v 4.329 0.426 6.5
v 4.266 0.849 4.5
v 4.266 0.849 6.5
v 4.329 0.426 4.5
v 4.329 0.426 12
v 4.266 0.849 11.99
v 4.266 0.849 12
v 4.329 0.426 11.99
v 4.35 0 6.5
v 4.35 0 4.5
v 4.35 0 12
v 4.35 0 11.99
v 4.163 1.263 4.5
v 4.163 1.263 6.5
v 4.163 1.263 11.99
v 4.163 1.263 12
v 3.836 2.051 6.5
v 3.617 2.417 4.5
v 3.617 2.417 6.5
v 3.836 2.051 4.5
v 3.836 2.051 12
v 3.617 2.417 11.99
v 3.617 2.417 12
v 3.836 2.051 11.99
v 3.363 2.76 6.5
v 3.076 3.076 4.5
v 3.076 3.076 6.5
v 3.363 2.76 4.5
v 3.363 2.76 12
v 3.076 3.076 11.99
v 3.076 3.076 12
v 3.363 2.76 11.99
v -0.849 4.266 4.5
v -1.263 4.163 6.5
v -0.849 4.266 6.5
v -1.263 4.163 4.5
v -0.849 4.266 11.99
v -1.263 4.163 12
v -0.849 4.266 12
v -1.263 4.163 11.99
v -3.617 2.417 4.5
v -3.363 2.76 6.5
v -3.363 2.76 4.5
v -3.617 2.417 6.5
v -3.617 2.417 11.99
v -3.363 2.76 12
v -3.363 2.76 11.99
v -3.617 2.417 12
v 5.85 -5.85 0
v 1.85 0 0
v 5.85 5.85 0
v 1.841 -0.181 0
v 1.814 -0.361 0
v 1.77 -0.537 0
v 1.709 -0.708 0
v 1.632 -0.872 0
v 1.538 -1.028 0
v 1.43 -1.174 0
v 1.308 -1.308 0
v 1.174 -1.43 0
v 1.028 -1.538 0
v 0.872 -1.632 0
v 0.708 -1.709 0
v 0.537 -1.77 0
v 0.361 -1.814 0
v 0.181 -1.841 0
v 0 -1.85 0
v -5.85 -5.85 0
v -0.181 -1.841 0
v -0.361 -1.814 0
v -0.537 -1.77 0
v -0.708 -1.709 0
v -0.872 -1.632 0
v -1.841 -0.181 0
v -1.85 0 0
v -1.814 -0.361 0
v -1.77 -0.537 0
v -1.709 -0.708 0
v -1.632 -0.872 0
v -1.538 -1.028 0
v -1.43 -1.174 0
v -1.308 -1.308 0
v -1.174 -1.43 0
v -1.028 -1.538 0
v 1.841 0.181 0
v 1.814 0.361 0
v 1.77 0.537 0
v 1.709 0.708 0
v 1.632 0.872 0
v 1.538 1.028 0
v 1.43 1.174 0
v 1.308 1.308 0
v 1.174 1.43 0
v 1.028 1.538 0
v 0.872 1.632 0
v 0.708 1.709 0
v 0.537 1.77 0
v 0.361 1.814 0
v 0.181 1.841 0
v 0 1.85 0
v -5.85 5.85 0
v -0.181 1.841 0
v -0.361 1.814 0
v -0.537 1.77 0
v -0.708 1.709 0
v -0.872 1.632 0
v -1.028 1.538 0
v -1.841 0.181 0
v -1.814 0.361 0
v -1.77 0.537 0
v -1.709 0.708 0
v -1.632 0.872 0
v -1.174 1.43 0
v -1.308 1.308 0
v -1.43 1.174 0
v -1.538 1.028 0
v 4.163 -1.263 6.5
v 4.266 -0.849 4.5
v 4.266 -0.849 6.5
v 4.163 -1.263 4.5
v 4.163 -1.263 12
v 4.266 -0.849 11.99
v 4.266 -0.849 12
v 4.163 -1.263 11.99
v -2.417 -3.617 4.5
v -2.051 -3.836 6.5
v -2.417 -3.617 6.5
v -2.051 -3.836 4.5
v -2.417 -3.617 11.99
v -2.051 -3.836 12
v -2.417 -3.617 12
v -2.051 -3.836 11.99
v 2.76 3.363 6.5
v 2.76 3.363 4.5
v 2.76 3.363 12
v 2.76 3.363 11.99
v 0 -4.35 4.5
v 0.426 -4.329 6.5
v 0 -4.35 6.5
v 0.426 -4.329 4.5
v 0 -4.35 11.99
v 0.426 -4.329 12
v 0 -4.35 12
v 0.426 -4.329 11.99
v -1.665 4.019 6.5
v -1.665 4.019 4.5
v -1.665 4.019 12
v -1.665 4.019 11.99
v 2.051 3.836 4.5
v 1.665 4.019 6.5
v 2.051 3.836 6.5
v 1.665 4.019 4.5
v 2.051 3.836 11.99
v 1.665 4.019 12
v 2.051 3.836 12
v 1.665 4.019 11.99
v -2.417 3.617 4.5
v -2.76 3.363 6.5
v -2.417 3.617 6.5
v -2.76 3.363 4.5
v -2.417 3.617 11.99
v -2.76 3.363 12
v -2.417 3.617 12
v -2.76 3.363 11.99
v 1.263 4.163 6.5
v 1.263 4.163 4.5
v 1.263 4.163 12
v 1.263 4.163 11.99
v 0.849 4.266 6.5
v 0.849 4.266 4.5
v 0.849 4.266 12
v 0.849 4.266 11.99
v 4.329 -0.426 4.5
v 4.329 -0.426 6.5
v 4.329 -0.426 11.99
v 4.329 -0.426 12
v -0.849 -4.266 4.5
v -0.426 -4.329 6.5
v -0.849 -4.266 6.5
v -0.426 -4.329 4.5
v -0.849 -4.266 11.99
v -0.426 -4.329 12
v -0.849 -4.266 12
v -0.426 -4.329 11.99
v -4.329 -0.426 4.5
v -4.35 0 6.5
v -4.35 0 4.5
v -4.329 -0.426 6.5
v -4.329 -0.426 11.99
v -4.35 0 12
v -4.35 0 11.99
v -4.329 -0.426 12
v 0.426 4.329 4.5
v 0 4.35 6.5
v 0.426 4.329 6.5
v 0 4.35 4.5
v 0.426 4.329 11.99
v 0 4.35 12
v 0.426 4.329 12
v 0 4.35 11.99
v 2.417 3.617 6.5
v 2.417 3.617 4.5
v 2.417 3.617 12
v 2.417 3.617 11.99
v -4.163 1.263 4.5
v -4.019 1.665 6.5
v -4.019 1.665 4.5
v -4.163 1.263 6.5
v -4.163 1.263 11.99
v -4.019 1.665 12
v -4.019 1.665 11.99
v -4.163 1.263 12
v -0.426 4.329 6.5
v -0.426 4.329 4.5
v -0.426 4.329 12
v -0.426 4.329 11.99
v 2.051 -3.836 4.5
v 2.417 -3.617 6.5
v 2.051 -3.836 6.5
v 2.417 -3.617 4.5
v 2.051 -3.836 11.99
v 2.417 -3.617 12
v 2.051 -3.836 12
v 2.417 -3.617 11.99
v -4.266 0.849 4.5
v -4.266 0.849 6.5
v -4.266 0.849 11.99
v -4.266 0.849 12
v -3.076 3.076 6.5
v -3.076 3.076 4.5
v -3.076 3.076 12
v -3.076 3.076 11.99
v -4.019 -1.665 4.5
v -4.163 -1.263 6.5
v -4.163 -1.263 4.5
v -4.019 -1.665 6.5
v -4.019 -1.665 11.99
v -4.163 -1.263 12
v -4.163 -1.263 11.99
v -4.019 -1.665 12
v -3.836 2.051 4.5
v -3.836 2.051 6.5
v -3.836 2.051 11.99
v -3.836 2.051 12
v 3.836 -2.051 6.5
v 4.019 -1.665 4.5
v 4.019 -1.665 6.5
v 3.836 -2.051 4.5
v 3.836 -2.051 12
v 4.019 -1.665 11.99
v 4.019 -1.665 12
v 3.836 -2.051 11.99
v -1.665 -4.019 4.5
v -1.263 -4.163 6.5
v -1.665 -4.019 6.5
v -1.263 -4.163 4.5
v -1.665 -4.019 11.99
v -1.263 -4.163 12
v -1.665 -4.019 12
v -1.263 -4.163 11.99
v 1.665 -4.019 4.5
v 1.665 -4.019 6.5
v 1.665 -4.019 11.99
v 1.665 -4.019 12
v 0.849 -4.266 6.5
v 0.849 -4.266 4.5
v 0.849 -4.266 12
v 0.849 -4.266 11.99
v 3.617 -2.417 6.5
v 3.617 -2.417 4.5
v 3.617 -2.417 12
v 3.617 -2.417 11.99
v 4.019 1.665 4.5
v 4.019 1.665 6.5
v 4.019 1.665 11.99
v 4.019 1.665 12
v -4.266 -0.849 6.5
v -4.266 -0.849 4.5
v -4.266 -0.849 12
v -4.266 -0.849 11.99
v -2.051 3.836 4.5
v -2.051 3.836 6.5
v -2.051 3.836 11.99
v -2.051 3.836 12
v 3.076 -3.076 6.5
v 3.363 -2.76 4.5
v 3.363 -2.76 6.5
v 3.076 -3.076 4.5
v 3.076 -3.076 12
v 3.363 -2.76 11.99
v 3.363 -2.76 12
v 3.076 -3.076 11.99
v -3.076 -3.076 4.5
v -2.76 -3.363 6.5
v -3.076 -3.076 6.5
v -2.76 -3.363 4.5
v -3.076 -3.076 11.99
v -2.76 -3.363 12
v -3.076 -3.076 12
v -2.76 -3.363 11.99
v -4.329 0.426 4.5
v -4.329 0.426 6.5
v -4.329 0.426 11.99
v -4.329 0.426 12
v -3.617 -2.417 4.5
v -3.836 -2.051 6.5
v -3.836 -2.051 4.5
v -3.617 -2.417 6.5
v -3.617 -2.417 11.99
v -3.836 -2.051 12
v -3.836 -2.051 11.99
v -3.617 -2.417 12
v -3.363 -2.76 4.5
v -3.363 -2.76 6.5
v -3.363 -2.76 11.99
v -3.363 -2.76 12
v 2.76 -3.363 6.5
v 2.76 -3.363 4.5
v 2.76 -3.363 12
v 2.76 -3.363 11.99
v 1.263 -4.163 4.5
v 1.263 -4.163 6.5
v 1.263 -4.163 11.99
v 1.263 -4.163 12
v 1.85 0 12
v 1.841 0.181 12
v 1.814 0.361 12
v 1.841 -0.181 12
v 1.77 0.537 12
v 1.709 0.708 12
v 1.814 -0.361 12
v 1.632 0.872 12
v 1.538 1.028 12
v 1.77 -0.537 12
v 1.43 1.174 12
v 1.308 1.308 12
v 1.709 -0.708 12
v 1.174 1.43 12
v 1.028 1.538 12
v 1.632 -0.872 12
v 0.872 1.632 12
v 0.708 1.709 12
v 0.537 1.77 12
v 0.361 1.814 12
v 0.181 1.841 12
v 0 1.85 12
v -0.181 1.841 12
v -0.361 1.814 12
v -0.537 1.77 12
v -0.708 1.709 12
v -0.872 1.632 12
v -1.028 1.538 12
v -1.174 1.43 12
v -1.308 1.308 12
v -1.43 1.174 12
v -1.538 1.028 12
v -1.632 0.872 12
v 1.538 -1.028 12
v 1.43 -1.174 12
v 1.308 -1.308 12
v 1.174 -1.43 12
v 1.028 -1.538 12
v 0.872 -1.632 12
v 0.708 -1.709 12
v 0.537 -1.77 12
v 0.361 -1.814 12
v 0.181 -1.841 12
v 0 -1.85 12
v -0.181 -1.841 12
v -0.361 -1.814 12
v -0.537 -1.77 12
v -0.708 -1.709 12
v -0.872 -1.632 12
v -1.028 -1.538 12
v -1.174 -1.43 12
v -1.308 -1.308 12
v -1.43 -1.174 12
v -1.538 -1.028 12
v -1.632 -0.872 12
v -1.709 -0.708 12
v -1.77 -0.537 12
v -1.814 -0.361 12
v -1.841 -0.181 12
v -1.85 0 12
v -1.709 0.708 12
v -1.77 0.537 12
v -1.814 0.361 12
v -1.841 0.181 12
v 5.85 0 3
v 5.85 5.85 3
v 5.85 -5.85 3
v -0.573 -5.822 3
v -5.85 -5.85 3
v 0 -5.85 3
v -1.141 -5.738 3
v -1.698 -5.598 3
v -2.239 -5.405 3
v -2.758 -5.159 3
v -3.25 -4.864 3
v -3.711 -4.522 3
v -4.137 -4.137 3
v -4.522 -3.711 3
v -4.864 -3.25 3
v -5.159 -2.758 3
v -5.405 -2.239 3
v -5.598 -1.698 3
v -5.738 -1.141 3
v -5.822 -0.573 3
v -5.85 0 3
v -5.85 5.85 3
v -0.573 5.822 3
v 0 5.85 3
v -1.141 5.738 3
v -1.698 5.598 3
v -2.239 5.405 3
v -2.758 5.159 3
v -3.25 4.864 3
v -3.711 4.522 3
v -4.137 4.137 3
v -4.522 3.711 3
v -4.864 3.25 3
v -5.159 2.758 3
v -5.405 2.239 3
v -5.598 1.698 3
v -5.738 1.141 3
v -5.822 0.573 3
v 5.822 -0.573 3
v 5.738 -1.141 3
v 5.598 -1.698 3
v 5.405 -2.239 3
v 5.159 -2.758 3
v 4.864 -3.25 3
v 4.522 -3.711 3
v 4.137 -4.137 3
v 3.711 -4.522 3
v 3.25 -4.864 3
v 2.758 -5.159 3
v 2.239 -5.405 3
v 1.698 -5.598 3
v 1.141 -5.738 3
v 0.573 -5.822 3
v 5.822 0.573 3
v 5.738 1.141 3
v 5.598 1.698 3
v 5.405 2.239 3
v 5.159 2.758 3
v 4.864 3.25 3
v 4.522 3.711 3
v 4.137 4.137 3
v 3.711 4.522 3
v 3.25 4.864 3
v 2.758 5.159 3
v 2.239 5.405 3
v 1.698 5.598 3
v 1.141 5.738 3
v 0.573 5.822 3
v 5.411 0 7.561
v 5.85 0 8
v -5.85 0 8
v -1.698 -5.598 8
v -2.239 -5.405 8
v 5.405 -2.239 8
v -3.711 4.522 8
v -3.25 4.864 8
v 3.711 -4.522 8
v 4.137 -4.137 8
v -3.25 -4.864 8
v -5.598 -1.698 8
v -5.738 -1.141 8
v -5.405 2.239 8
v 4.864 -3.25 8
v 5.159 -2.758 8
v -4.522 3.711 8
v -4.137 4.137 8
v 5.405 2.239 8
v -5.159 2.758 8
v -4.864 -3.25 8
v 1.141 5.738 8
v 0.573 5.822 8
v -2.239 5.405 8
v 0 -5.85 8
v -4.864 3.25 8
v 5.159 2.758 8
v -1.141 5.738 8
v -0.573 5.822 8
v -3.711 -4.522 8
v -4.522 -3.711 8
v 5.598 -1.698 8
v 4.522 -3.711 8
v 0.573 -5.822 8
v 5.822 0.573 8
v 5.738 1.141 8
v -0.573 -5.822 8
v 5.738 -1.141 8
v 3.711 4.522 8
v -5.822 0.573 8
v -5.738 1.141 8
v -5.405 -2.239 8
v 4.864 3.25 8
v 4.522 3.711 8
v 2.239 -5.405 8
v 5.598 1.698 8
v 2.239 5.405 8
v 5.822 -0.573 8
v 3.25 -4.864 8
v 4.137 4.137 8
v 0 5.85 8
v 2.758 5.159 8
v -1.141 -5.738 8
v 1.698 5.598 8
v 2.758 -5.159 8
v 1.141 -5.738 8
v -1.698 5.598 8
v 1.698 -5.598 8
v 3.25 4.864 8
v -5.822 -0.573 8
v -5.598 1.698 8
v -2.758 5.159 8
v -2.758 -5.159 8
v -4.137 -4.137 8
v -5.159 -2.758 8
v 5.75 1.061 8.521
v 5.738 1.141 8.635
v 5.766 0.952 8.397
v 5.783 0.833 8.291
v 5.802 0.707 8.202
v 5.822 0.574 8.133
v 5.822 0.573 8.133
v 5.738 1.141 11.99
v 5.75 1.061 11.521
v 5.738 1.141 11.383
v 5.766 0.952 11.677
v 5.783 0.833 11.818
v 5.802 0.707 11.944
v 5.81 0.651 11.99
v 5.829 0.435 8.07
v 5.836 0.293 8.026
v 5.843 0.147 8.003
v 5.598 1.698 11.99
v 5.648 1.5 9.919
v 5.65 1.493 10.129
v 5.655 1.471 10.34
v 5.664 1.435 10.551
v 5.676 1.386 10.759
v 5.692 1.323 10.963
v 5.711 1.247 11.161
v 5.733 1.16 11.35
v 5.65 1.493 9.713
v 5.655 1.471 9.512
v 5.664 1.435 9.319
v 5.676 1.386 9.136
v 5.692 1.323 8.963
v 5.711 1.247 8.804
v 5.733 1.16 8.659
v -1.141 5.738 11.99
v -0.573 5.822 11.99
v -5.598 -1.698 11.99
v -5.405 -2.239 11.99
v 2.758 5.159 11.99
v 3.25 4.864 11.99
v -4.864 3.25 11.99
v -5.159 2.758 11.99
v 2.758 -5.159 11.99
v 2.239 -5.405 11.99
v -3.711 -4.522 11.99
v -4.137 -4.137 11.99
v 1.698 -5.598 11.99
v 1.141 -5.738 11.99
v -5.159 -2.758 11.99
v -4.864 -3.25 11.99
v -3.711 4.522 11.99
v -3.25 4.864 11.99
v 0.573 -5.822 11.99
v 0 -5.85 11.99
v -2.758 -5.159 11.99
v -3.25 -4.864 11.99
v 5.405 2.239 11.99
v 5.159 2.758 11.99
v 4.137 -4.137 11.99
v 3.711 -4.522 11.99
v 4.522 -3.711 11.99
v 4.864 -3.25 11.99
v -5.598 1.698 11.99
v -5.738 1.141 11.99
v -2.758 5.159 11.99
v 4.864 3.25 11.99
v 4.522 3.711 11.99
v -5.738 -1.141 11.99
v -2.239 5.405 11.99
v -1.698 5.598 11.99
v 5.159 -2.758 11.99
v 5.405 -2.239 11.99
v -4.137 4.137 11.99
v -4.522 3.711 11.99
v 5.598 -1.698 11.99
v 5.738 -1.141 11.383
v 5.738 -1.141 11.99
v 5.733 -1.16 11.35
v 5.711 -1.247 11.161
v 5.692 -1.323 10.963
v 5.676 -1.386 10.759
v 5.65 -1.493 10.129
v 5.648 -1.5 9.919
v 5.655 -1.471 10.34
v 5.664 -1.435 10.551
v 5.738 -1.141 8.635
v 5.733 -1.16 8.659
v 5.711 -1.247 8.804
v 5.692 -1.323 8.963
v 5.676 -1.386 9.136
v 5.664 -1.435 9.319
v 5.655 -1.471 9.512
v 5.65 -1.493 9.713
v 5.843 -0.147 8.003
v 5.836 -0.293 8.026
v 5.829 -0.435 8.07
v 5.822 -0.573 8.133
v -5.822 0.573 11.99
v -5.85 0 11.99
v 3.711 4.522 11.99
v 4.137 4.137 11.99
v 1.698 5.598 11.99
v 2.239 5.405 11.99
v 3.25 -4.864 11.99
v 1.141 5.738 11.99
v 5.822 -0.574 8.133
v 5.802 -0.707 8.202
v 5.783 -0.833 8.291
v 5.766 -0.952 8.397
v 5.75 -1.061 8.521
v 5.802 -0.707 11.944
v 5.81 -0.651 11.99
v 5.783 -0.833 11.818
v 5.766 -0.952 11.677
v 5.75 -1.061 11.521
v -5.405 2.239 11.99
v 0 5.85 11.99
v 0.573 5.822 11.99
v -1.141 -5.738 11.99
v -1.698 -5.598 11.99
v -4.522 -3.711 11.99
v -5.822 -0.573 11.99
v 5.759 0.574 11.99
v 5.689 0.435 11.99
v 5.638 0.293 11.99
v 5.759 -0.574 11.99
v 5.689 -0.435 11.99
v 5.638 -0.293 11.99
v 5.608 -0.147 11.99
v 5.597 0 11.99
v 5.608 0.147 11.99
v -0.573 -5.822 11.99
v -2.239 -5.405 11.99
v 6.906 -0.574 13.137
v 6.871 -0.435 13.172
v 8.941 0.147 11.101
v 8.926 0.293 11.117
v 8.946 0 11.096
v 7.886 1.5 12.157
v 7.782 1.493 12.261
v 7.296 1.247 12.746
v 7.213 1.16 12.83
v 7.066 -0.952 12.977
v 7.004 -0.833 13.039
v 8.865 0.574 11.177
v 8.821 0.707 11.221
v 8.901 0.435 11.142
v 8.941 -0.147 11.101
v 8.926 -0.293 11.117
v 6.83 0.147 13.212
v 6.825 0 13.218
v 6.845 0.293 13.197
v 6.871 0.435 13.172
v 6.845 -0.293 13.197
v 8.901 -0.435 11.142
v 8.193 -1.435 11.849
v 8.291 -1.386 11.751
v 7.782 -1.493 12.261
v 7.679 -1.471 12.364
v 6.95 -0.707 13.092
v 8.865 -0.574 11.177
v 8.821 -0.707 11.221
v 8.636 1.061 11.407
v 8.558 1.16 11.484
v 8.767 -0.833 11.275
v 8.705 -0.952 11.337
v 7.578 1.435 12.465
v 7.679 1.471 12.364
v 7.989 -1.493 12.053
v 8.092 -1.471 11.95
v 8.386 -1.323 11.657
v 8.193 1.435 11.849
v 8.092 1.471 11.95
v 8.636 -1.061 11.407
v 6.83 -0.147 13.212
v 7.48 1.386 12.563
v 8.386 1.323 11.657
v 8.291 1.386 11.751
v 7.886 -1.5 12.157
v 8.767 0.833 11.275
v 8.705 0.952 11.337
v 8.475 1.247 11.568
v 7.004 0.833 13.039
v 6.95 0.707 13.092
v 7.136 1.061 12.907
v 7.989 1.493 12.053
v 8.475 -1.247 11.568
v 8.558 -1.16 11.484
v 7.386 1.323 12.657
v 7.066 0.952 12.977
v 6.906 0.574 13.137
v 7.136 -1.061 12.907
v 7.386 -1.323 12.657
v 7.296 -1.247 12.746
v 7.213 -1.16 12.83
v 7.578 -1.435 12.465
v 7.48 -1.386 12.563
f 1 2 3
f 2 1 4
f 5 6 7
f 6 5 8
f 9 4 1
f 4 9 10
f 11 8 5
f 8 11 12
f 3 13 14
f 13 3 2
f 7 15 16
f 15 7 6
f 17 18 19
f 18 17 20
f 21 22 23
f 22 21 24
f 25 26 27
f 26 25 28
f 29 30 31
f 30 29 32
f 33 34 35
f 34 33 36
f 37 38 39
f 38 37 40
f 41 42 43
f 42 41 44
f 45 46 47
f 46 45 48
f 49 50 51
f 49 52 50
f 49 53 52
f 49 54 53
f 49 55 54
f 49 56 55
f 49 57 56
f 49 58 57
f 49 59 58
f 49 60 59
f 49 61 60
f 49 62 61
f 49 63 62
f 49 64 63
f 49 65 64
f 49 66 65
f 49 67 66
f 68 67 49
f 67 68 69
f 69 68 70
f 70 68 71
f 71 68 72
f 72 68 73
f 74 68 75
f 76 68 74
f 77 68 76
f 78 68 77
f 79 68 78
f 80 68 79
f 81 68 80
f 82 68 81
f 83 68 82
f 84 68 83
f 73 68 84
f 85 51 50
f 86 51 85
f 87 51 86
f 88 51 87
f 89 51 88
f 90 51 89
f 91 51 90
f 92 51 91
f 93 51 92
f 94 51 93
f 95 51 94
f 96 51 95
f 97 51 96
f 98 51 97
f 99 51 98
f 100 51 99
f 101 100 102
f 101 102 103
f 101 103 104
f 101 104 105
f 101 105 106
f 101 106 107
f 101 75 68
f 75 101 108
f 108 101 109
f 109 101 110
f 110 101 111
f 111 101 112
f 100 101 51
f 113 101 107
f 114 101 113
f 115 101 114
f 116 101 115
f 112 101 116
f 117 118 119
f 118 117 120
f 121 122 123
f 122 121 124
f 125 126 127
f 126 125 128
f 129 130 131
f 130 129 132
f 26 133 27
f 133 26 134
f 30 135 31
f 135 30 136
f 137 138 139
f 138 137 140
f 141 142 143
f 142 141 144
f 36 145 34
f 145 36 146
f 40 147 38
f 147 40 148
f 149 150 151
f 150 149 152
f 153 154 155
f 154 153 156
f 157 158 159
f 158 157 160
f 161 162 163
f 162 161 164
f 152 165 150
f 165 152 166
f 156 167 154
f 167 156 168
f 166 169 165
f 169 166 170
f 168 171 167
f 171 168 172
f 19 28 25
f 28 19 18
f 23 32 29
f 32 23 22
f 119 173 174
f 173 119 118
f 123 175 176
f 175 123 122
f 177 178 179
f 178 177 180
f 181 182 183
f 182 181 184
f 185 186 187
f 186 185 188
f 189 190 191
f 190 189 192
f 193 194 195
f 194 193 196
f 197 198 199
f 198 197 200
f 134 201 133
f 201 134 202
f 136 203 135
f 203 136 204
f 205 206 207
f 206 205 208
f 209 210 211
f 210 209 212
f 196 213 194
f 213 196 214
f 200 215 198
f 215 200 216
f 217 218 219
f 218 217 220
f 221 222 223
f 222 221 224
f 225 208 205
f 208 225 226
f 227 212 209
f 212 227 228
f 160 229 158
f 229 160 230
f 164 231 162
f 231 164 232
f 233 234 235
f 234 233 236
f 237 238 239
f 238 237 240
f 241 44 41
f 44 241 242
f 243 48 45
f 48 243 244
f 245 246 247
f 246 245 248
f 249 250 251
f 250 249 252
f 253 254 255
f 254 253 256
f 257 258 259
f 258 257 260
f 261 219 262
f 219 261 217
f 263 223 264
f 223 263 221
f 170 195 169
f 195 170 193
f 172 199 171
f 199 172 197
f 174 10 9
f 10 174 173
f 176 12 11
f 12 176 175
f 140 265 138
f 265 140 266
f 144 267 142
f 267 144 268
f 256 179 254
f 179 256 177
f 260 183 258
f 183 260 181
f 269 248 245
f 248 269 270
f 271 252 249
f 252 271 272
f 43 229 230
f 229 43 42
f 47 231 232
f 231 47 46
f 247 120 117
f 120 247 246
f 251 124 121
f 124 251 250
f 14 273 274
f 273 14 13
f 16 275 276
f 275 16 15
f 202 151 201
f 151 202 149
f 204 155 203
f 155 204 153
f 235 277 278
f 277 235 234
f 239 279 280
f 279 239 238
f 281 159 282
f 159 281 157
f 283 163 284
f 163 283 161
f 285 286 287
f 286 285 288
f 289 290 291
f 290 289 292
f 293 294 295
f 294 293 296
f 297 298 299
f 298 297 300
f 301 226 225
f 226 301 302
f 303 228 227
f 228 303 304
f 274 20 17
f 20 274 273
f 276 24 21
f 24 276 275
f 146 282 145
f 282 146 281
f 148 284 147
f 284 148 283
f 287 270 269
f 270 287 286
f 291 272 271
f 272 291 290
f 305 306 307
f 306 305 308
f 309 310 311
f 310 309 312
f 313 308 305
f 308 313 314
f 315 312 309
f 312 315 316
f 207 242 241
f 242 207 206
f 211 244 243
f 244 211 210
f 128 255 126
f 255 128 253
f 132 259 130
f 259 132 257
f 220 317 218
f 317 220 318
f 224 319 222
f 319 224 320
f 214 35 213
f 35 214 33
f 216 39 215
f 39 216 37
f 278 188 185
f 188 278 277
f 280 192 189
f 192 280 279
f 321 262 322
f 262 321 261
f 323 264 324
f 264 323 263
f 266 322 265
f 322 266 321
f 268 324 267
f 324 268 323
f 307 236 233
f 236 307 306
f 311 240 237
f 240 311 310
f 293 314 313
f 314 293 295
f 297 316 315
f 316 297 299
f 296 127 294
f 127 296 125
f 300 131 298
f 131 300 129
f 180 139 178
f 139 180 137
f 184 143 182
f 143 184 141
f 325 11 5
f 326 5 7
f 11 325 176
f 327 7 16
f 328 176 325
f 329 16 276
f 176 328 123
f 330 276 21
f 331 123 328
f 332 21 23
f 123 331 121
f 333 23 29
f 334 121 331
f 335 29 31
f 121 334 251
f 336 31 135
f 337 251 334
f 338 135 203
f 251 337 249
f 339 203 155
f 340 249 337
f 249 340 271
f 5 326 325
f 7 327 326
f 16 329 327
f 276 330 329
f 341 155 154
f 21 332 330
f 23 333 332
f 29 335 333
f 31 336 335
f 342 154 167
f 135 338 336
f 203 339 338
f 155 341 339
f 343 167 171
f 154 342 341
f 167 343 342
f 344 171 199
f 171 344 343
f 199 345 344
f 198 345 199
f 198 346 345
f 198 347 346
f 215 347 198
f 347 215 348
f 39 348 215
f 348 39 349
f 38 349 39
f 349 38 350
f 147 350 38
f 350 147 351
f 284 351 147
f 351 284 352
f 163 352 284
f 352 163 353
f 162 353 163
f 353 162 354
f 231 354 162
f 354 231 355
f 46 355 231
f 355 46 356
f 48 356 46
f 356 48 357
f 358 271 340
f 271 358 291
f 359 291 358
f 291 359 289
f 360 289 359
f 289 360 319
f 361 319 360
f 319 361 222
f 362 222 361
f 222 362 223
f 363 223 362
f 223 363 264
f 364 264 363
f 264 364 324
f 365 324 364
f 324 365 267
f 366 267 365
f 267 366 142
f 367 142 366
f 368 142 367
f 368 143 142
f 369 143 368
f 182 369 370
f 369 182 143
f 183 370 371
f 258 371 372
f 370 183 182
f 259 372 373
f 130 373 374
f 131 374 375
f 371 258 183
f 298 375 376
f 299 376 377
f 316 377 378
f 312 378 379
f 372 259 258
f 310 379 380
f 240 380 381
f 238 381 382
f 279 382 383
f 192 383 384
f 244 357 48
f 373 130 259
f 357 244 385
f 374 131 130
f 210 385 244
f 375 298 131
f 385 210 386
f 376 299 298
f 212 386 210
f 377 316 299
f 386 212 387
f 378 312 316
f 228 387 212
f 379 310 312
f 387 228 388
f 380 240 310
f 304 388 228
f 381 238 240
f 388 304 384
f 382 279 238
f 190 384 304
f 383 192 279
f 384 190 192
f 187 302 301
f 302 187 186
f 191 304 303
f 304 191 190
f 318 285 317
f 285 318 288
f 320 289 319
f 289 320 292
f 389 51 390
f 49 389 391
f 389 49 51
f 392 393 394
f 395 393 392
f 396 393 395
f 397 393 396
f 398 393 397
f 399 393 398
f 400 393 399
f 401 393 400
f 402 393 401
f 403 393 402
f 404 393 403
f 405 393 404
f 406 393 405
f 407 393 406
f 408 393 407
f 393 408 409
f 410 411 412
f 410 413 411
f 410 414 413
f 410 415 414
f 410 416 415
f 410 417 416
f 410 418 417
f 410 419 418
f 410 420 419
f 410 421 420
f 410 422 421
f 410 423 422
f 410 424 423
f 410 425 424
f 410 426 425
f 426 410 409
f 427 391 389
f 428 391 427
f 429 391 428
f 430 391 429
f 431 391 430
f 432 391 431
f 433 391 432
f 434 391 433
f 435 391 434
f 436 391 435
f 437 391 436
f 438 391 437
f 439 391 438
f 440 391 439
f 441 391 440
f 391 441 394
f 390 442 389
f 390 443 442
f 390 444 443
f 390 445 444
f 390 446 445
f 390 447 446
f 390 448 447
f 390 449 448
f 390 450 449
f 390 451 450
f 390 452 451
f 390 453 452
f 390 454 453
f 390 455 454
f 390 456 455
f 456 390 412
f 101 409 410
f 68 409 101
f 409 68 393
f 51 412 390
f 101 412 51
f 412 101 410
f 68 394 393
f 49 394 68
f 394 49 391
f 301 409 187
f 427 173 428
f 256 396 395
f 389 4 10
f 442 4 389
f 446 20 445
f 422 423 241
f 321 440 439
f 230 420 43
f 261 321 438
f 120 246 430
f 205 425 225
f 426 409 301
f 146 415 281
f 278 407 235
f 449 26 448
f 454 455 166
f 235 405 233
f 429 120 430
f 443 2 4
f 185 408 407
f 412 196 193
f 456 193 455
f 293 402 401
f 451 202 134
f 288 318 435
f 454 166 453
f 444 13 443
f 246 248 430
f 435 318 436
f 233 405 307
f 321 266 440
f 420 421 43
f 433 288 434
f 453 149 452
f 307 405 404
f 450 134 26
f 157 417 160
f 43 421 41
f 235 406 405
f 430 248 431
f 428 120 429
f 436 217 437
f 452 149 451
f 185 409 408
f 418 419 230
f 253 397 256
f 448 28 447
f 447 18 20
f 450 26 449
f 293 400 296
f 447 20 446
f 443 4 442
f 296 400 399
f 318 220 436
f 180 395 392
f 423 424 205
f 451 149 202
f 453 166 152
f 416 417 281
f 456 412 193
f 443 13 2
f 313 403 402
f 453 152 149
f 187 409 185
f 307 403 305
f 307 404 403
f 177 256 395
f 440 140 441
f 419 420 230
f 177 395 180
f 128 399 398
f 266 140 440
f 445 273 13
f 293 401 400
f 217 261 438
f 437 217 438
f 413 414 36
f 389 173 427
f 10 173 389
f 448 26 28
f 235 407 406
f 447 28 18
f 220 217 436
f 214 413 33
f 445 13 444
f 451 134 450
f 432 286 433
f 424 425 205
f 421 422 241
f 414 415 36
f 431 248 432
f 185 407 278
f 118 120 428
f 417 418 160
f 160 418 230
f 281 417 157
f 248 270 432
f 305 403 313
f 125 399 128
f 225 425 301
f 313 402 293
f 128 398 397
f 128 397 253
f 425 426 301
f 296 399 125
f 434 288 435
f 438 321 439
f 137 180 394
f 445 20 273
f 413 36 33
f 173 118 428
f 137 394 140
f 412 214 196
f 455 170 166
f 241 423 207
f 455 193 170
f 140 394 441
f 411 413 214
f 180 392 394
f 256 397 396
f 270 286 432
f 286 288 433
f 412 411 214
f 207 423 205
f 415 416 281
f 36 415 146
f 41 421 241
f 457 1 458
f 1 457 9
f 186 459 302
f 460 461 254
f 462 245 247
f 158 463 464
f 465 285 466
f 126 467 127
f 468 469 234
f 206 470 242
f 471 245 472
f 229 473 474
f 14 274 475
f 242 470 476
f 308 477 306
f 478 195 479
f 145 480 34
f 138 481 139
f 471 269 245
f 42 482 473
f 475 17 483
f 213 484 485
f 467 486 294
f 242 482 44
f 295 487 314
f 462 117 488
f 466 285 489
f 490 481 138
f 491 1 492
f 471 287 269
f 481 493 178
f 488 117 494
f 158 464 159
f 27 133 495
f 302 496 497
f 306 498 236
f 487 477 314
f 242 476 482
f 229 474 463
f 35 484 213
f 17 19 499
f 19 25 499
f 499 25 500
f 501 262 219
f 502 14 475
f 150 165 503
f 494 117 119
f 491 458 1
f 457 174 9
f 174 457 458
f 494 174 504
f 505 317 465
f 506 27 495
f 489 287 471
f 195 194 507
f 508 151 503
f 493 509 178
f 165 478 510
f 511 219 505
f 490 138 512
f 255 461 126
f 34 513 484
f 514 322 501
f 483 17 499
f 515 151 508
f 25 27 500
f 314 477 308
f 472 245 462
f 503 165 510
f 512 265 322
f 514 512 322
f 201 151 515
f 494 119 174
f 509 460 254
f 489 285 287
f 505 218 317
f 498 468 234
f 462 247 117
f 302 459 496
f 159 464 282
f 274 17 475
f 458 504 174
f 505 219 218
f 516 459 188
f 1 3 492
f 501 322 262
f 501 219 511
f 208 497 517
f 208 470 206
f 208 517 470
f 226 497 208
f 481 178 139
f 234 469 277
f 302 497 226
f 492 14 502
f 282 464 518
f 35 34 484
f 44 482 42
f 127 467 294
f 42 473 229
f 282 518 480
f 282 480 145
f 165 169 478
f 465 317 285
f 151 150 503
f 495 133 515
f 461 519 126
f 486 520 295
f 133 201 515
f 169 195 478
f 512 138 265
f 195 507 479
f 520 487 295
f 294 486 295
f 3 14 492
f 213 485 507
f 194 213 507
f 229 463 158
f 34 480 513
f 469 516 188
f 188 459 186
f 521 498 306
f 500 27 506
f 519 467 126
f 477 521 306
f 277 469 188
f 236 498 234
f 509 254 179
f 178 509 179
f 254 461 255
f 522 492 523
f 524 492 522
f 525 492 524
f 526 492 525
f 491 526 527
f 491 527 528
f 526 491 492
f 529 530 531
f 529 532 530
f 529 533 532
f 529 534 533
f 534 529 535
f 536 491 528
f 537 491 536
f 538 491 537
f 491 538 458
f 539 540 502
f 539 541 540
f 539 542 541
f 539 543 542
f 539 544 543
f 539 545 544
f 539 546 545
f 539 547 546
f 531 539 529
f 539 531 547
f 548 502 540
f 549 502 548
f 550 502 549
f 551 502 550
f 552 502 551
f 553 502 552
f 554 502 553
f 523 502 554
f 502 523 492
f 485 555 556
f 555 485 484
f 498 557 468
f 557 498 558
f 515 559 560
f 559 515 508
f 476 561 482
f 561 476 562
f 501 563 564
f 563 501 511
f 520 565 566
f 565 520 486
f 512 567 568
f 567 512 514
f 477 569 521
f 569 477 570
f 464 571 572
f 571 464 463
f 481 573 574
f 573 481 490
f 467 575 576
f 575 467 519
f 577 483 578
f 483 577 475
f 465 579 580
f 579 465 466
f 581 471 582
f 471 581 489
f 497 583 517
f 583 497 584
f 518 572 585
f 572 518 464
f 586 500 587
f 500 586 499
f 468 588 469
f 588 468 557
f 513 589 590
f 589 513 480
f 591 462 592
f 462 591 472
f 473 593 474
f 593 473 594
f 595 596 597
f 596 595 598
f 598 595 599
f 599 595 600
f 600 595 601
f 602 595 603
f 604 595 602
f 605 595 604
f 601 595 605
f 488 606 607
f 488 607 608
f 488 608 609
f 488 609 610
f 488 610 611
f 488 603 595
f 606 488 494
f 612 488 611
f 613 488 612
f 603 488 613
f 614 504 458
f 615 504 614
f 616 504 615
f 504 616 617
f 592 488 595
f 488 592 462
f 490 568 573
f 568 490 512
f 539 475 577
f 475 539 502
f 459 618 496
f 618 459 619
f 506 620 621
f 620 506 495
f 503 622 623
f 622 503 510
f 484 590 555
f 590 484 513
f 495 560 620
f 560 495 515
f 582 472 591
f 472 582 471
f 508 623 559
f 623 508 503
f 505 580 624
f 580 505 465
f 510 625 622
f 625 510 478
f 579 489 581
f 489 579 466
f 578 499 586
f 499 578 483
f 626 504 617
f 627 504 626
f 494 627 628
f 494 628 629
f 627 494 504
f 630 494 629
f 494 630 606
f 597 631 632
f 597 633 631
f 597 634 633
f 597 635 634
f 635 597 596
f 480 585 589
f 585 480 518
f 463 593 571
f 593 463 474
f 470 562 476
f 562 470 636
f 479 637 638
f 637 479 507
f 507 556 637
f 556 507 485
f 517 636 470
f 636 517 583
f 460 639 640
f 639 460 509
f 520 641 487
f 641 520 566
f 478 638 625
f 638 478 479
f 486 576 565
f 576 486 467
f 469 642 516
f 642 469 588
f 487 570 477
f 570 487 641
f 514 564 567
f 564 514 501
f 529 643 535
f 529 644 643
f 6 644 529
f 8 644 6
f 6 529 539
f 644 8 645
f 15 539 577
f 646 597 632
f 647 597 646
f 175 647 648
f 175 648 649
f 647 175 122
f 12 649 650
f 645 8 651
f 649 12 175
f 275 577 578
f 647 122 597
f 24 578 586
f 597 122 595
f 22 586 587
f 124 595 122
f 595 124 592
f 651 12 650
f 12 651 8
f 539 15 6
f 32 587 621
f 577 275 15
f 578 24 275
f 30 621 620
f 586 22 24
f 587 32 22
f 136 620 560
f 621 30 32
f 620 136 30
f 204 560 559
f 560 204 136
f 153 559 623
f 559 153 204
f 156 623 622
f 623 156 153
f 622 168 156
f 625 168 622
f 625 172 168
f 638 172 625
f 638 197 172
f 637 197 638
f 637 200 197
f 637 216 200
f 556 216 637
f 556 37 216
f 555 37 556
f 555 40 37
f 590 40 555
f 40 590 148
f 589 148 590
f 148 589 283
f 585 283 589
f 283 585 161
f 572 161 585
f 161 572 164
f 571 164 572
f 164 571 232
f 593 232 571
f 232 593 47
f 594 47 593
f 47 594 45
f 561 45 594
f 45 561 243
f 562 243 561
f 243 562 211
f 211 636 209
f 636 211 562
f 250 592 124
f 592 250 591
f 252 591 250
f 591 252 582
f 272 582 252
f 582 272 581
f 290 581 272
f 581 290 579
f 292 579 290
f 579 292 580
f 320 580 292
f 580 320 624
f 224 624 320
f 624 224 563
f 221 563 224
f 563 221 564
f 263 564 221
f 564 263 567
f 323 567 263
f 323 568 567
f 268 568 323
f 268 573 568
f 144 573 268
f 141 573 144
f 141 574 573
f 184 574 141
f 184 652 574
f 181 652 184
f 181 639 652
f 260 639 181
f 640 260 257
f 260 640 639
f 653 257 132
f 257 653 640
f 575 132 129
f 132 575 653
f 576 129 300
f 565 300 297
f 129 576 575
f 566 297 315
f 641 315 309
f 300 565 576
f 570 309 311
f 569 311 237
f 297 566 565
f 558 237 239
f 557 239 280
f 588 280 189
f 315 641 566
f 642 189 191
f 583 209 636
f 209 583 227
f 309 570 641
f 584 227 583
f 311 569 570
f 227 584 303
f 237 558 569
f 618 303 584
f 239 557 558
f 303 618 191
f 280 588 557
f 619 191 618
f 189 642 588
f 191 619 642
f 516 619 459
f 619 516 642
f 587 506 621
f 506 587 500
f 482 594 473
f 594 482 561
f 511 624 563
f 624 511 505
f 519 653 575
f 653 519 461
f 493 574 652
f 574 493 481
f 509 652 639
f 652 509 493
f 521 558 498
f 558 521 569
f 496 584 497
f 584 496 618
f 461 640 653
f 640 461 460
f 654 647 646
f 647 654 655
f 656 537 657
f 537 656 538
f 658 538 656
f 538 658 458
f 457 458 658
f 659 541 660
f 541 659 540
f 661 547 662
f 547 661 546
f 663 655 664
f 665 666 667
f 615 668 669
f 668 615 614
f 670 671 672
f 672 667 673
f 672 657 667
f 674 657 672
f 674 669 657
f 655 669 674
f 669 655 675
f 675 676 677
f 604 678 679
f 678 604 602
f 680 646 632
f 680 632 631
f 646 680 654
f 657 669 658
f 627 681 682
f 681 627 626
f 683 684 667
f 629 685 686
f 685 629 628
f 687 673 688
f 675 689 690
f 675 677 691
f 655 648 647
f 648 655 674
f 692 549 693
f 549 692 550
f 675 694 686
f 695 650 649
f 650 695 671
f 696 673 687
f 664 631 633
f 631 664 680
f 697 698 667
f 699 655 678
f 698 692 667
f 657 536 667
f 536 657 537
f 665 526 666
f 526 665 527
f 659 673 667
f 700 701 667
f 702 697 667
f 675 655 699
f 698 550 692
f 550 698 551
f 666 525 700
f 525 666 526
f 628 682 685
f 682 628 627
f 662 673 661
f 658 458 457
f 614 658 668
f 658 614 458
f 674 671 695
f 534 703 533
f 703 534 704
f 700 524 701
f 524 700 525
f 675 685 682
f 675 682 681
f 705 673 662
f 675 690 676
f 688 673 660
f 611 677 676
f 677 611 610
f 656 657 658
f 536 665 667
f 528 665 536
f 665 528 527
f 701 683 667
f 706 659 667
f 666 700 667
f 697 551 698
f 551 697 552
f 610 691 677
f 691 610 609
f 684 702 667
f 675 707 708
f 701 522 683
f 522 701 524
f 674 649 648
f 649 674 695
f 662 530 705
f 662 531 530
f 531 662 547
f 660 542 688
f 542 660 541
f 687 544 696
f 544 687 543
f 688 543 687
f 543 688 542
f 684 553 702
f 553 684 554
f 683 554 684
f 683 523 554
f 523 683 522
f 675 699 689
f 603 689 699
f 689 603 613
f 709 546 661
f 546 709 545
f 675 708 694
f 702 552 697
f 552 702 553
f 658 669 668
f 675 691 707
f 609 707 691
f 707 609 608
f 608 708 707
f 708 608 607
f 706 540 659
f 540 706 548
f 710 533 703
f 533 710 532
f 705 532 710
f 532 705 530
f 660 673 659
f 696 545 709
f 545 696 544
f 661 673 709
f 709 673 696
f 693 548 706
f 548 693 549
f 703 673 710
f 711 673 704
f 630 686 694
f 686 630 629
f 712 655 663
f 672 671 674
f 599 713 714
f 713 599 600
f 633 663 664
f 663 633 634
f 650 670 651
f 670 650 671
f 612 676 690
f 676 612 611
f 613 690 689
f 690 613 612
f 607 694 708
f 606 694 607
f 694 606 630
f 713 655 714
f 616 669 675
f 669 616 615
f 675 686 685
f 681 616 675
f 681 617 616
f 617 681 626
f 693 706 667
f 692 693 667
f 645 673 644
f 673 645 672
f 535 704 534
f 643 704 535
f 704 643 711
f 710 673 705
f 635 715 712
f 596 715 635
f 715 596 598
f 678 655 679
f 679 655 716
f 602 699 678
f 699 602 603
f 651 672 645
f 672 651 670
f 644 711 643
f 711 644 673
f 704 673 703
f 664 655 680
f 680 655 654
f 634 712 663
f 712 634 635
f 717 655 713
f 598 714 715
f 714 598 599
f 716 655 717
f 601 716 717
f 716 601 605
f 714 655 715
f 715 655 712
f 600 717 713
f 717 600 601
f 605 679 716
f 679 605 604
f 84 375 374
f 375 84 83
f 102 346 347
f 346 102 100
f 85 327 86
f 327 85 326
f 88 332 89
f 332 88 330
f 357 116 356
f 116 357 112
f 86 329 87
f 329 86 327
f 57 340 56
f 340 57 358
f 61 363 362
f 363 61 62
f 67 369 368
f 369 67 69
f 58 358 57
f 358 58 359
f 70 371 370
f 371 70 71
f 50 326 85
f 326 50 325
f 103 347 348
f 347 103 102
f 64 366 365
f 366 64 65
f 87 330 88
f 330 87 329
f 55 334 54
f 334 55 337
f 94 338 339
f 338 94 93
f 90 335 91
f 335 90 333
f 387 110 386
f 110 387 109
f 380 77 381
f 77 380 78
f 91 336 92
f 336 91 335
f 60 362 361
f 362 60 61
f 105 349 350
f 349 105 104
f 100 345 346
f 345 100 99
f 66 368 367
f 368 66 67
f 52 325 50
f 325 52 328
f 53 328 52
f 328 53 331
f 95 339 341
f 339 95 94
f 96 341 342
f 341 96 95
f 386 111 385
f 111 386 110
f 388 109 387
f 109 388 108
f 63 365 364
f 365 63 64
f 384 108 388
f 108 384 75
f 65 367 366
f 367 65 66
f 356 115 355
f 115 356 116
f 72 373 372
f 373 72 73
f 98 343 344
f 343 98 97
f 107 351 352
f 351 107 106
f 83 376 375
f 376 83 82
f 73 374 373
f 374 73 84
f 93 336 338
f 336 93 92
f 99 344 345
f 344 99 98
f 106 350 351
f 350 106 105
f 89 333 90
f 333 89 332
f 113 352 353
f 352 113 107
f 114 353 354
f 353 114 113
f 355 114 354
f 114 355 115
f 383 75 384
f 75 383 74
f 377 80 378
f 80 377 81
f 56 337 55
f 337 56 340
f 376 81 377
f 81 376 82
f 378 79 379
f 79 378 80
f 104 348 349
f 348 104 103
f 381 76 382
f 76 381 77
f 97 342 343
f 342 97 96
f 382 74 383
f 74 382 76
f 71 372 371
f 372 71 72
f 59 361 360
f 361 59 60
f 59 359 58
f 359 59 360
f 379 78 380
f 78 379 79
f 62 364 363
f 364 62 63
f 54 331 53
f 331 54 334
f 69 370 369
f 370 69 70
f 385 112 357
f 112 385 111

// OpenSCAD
ST = 0.01;

wire_spool($fn=64);

module wire_spool(
  screw_r=3.7/2,
  width=2*4 + 3.7,
  base_h=3,
  wire_slit_h=2,
  wire_slit_r=3.7/2 + 2.5,
  wire_grip_r=3/2,
  wire_grip_h=5,
  total_h=12)
{
  dr = width/2 - wire_slit_r;
  difference() {
    union() {
      cylinder(r=wire_slit_r, h=total_h);
      translate([0,0,base_h/2])
        cube([width, width, base_h], center=true);
      translate([0,0,base_h])
        cylinder(r1=width/2, r2=wire_slit_r, h=dr);
      translate([0,0,base_h + dr +wire_slit_h])
        cylinder(r2=width/2, r1=wire_slit_r, h=dr);
      translate([0,0,base_h + 2*dr +wire_slit_h])
        cylinder(r=width/2, h=total_h - (base_h + 2*dr +wire_slit_h) - ST);
      translate([wire_slit_r,
                 0,
                 base_h + dr + wire_slit_h + 2/sqrt(2)*wire_grip_r])
        rotate([0,45,0])
          cylinder(r=wire_grip_r, h=wire_grip_h);
    }
    translate([0,0,-1])
      #cylinder(r=screw_r, h=total_h +2);
  }
}
